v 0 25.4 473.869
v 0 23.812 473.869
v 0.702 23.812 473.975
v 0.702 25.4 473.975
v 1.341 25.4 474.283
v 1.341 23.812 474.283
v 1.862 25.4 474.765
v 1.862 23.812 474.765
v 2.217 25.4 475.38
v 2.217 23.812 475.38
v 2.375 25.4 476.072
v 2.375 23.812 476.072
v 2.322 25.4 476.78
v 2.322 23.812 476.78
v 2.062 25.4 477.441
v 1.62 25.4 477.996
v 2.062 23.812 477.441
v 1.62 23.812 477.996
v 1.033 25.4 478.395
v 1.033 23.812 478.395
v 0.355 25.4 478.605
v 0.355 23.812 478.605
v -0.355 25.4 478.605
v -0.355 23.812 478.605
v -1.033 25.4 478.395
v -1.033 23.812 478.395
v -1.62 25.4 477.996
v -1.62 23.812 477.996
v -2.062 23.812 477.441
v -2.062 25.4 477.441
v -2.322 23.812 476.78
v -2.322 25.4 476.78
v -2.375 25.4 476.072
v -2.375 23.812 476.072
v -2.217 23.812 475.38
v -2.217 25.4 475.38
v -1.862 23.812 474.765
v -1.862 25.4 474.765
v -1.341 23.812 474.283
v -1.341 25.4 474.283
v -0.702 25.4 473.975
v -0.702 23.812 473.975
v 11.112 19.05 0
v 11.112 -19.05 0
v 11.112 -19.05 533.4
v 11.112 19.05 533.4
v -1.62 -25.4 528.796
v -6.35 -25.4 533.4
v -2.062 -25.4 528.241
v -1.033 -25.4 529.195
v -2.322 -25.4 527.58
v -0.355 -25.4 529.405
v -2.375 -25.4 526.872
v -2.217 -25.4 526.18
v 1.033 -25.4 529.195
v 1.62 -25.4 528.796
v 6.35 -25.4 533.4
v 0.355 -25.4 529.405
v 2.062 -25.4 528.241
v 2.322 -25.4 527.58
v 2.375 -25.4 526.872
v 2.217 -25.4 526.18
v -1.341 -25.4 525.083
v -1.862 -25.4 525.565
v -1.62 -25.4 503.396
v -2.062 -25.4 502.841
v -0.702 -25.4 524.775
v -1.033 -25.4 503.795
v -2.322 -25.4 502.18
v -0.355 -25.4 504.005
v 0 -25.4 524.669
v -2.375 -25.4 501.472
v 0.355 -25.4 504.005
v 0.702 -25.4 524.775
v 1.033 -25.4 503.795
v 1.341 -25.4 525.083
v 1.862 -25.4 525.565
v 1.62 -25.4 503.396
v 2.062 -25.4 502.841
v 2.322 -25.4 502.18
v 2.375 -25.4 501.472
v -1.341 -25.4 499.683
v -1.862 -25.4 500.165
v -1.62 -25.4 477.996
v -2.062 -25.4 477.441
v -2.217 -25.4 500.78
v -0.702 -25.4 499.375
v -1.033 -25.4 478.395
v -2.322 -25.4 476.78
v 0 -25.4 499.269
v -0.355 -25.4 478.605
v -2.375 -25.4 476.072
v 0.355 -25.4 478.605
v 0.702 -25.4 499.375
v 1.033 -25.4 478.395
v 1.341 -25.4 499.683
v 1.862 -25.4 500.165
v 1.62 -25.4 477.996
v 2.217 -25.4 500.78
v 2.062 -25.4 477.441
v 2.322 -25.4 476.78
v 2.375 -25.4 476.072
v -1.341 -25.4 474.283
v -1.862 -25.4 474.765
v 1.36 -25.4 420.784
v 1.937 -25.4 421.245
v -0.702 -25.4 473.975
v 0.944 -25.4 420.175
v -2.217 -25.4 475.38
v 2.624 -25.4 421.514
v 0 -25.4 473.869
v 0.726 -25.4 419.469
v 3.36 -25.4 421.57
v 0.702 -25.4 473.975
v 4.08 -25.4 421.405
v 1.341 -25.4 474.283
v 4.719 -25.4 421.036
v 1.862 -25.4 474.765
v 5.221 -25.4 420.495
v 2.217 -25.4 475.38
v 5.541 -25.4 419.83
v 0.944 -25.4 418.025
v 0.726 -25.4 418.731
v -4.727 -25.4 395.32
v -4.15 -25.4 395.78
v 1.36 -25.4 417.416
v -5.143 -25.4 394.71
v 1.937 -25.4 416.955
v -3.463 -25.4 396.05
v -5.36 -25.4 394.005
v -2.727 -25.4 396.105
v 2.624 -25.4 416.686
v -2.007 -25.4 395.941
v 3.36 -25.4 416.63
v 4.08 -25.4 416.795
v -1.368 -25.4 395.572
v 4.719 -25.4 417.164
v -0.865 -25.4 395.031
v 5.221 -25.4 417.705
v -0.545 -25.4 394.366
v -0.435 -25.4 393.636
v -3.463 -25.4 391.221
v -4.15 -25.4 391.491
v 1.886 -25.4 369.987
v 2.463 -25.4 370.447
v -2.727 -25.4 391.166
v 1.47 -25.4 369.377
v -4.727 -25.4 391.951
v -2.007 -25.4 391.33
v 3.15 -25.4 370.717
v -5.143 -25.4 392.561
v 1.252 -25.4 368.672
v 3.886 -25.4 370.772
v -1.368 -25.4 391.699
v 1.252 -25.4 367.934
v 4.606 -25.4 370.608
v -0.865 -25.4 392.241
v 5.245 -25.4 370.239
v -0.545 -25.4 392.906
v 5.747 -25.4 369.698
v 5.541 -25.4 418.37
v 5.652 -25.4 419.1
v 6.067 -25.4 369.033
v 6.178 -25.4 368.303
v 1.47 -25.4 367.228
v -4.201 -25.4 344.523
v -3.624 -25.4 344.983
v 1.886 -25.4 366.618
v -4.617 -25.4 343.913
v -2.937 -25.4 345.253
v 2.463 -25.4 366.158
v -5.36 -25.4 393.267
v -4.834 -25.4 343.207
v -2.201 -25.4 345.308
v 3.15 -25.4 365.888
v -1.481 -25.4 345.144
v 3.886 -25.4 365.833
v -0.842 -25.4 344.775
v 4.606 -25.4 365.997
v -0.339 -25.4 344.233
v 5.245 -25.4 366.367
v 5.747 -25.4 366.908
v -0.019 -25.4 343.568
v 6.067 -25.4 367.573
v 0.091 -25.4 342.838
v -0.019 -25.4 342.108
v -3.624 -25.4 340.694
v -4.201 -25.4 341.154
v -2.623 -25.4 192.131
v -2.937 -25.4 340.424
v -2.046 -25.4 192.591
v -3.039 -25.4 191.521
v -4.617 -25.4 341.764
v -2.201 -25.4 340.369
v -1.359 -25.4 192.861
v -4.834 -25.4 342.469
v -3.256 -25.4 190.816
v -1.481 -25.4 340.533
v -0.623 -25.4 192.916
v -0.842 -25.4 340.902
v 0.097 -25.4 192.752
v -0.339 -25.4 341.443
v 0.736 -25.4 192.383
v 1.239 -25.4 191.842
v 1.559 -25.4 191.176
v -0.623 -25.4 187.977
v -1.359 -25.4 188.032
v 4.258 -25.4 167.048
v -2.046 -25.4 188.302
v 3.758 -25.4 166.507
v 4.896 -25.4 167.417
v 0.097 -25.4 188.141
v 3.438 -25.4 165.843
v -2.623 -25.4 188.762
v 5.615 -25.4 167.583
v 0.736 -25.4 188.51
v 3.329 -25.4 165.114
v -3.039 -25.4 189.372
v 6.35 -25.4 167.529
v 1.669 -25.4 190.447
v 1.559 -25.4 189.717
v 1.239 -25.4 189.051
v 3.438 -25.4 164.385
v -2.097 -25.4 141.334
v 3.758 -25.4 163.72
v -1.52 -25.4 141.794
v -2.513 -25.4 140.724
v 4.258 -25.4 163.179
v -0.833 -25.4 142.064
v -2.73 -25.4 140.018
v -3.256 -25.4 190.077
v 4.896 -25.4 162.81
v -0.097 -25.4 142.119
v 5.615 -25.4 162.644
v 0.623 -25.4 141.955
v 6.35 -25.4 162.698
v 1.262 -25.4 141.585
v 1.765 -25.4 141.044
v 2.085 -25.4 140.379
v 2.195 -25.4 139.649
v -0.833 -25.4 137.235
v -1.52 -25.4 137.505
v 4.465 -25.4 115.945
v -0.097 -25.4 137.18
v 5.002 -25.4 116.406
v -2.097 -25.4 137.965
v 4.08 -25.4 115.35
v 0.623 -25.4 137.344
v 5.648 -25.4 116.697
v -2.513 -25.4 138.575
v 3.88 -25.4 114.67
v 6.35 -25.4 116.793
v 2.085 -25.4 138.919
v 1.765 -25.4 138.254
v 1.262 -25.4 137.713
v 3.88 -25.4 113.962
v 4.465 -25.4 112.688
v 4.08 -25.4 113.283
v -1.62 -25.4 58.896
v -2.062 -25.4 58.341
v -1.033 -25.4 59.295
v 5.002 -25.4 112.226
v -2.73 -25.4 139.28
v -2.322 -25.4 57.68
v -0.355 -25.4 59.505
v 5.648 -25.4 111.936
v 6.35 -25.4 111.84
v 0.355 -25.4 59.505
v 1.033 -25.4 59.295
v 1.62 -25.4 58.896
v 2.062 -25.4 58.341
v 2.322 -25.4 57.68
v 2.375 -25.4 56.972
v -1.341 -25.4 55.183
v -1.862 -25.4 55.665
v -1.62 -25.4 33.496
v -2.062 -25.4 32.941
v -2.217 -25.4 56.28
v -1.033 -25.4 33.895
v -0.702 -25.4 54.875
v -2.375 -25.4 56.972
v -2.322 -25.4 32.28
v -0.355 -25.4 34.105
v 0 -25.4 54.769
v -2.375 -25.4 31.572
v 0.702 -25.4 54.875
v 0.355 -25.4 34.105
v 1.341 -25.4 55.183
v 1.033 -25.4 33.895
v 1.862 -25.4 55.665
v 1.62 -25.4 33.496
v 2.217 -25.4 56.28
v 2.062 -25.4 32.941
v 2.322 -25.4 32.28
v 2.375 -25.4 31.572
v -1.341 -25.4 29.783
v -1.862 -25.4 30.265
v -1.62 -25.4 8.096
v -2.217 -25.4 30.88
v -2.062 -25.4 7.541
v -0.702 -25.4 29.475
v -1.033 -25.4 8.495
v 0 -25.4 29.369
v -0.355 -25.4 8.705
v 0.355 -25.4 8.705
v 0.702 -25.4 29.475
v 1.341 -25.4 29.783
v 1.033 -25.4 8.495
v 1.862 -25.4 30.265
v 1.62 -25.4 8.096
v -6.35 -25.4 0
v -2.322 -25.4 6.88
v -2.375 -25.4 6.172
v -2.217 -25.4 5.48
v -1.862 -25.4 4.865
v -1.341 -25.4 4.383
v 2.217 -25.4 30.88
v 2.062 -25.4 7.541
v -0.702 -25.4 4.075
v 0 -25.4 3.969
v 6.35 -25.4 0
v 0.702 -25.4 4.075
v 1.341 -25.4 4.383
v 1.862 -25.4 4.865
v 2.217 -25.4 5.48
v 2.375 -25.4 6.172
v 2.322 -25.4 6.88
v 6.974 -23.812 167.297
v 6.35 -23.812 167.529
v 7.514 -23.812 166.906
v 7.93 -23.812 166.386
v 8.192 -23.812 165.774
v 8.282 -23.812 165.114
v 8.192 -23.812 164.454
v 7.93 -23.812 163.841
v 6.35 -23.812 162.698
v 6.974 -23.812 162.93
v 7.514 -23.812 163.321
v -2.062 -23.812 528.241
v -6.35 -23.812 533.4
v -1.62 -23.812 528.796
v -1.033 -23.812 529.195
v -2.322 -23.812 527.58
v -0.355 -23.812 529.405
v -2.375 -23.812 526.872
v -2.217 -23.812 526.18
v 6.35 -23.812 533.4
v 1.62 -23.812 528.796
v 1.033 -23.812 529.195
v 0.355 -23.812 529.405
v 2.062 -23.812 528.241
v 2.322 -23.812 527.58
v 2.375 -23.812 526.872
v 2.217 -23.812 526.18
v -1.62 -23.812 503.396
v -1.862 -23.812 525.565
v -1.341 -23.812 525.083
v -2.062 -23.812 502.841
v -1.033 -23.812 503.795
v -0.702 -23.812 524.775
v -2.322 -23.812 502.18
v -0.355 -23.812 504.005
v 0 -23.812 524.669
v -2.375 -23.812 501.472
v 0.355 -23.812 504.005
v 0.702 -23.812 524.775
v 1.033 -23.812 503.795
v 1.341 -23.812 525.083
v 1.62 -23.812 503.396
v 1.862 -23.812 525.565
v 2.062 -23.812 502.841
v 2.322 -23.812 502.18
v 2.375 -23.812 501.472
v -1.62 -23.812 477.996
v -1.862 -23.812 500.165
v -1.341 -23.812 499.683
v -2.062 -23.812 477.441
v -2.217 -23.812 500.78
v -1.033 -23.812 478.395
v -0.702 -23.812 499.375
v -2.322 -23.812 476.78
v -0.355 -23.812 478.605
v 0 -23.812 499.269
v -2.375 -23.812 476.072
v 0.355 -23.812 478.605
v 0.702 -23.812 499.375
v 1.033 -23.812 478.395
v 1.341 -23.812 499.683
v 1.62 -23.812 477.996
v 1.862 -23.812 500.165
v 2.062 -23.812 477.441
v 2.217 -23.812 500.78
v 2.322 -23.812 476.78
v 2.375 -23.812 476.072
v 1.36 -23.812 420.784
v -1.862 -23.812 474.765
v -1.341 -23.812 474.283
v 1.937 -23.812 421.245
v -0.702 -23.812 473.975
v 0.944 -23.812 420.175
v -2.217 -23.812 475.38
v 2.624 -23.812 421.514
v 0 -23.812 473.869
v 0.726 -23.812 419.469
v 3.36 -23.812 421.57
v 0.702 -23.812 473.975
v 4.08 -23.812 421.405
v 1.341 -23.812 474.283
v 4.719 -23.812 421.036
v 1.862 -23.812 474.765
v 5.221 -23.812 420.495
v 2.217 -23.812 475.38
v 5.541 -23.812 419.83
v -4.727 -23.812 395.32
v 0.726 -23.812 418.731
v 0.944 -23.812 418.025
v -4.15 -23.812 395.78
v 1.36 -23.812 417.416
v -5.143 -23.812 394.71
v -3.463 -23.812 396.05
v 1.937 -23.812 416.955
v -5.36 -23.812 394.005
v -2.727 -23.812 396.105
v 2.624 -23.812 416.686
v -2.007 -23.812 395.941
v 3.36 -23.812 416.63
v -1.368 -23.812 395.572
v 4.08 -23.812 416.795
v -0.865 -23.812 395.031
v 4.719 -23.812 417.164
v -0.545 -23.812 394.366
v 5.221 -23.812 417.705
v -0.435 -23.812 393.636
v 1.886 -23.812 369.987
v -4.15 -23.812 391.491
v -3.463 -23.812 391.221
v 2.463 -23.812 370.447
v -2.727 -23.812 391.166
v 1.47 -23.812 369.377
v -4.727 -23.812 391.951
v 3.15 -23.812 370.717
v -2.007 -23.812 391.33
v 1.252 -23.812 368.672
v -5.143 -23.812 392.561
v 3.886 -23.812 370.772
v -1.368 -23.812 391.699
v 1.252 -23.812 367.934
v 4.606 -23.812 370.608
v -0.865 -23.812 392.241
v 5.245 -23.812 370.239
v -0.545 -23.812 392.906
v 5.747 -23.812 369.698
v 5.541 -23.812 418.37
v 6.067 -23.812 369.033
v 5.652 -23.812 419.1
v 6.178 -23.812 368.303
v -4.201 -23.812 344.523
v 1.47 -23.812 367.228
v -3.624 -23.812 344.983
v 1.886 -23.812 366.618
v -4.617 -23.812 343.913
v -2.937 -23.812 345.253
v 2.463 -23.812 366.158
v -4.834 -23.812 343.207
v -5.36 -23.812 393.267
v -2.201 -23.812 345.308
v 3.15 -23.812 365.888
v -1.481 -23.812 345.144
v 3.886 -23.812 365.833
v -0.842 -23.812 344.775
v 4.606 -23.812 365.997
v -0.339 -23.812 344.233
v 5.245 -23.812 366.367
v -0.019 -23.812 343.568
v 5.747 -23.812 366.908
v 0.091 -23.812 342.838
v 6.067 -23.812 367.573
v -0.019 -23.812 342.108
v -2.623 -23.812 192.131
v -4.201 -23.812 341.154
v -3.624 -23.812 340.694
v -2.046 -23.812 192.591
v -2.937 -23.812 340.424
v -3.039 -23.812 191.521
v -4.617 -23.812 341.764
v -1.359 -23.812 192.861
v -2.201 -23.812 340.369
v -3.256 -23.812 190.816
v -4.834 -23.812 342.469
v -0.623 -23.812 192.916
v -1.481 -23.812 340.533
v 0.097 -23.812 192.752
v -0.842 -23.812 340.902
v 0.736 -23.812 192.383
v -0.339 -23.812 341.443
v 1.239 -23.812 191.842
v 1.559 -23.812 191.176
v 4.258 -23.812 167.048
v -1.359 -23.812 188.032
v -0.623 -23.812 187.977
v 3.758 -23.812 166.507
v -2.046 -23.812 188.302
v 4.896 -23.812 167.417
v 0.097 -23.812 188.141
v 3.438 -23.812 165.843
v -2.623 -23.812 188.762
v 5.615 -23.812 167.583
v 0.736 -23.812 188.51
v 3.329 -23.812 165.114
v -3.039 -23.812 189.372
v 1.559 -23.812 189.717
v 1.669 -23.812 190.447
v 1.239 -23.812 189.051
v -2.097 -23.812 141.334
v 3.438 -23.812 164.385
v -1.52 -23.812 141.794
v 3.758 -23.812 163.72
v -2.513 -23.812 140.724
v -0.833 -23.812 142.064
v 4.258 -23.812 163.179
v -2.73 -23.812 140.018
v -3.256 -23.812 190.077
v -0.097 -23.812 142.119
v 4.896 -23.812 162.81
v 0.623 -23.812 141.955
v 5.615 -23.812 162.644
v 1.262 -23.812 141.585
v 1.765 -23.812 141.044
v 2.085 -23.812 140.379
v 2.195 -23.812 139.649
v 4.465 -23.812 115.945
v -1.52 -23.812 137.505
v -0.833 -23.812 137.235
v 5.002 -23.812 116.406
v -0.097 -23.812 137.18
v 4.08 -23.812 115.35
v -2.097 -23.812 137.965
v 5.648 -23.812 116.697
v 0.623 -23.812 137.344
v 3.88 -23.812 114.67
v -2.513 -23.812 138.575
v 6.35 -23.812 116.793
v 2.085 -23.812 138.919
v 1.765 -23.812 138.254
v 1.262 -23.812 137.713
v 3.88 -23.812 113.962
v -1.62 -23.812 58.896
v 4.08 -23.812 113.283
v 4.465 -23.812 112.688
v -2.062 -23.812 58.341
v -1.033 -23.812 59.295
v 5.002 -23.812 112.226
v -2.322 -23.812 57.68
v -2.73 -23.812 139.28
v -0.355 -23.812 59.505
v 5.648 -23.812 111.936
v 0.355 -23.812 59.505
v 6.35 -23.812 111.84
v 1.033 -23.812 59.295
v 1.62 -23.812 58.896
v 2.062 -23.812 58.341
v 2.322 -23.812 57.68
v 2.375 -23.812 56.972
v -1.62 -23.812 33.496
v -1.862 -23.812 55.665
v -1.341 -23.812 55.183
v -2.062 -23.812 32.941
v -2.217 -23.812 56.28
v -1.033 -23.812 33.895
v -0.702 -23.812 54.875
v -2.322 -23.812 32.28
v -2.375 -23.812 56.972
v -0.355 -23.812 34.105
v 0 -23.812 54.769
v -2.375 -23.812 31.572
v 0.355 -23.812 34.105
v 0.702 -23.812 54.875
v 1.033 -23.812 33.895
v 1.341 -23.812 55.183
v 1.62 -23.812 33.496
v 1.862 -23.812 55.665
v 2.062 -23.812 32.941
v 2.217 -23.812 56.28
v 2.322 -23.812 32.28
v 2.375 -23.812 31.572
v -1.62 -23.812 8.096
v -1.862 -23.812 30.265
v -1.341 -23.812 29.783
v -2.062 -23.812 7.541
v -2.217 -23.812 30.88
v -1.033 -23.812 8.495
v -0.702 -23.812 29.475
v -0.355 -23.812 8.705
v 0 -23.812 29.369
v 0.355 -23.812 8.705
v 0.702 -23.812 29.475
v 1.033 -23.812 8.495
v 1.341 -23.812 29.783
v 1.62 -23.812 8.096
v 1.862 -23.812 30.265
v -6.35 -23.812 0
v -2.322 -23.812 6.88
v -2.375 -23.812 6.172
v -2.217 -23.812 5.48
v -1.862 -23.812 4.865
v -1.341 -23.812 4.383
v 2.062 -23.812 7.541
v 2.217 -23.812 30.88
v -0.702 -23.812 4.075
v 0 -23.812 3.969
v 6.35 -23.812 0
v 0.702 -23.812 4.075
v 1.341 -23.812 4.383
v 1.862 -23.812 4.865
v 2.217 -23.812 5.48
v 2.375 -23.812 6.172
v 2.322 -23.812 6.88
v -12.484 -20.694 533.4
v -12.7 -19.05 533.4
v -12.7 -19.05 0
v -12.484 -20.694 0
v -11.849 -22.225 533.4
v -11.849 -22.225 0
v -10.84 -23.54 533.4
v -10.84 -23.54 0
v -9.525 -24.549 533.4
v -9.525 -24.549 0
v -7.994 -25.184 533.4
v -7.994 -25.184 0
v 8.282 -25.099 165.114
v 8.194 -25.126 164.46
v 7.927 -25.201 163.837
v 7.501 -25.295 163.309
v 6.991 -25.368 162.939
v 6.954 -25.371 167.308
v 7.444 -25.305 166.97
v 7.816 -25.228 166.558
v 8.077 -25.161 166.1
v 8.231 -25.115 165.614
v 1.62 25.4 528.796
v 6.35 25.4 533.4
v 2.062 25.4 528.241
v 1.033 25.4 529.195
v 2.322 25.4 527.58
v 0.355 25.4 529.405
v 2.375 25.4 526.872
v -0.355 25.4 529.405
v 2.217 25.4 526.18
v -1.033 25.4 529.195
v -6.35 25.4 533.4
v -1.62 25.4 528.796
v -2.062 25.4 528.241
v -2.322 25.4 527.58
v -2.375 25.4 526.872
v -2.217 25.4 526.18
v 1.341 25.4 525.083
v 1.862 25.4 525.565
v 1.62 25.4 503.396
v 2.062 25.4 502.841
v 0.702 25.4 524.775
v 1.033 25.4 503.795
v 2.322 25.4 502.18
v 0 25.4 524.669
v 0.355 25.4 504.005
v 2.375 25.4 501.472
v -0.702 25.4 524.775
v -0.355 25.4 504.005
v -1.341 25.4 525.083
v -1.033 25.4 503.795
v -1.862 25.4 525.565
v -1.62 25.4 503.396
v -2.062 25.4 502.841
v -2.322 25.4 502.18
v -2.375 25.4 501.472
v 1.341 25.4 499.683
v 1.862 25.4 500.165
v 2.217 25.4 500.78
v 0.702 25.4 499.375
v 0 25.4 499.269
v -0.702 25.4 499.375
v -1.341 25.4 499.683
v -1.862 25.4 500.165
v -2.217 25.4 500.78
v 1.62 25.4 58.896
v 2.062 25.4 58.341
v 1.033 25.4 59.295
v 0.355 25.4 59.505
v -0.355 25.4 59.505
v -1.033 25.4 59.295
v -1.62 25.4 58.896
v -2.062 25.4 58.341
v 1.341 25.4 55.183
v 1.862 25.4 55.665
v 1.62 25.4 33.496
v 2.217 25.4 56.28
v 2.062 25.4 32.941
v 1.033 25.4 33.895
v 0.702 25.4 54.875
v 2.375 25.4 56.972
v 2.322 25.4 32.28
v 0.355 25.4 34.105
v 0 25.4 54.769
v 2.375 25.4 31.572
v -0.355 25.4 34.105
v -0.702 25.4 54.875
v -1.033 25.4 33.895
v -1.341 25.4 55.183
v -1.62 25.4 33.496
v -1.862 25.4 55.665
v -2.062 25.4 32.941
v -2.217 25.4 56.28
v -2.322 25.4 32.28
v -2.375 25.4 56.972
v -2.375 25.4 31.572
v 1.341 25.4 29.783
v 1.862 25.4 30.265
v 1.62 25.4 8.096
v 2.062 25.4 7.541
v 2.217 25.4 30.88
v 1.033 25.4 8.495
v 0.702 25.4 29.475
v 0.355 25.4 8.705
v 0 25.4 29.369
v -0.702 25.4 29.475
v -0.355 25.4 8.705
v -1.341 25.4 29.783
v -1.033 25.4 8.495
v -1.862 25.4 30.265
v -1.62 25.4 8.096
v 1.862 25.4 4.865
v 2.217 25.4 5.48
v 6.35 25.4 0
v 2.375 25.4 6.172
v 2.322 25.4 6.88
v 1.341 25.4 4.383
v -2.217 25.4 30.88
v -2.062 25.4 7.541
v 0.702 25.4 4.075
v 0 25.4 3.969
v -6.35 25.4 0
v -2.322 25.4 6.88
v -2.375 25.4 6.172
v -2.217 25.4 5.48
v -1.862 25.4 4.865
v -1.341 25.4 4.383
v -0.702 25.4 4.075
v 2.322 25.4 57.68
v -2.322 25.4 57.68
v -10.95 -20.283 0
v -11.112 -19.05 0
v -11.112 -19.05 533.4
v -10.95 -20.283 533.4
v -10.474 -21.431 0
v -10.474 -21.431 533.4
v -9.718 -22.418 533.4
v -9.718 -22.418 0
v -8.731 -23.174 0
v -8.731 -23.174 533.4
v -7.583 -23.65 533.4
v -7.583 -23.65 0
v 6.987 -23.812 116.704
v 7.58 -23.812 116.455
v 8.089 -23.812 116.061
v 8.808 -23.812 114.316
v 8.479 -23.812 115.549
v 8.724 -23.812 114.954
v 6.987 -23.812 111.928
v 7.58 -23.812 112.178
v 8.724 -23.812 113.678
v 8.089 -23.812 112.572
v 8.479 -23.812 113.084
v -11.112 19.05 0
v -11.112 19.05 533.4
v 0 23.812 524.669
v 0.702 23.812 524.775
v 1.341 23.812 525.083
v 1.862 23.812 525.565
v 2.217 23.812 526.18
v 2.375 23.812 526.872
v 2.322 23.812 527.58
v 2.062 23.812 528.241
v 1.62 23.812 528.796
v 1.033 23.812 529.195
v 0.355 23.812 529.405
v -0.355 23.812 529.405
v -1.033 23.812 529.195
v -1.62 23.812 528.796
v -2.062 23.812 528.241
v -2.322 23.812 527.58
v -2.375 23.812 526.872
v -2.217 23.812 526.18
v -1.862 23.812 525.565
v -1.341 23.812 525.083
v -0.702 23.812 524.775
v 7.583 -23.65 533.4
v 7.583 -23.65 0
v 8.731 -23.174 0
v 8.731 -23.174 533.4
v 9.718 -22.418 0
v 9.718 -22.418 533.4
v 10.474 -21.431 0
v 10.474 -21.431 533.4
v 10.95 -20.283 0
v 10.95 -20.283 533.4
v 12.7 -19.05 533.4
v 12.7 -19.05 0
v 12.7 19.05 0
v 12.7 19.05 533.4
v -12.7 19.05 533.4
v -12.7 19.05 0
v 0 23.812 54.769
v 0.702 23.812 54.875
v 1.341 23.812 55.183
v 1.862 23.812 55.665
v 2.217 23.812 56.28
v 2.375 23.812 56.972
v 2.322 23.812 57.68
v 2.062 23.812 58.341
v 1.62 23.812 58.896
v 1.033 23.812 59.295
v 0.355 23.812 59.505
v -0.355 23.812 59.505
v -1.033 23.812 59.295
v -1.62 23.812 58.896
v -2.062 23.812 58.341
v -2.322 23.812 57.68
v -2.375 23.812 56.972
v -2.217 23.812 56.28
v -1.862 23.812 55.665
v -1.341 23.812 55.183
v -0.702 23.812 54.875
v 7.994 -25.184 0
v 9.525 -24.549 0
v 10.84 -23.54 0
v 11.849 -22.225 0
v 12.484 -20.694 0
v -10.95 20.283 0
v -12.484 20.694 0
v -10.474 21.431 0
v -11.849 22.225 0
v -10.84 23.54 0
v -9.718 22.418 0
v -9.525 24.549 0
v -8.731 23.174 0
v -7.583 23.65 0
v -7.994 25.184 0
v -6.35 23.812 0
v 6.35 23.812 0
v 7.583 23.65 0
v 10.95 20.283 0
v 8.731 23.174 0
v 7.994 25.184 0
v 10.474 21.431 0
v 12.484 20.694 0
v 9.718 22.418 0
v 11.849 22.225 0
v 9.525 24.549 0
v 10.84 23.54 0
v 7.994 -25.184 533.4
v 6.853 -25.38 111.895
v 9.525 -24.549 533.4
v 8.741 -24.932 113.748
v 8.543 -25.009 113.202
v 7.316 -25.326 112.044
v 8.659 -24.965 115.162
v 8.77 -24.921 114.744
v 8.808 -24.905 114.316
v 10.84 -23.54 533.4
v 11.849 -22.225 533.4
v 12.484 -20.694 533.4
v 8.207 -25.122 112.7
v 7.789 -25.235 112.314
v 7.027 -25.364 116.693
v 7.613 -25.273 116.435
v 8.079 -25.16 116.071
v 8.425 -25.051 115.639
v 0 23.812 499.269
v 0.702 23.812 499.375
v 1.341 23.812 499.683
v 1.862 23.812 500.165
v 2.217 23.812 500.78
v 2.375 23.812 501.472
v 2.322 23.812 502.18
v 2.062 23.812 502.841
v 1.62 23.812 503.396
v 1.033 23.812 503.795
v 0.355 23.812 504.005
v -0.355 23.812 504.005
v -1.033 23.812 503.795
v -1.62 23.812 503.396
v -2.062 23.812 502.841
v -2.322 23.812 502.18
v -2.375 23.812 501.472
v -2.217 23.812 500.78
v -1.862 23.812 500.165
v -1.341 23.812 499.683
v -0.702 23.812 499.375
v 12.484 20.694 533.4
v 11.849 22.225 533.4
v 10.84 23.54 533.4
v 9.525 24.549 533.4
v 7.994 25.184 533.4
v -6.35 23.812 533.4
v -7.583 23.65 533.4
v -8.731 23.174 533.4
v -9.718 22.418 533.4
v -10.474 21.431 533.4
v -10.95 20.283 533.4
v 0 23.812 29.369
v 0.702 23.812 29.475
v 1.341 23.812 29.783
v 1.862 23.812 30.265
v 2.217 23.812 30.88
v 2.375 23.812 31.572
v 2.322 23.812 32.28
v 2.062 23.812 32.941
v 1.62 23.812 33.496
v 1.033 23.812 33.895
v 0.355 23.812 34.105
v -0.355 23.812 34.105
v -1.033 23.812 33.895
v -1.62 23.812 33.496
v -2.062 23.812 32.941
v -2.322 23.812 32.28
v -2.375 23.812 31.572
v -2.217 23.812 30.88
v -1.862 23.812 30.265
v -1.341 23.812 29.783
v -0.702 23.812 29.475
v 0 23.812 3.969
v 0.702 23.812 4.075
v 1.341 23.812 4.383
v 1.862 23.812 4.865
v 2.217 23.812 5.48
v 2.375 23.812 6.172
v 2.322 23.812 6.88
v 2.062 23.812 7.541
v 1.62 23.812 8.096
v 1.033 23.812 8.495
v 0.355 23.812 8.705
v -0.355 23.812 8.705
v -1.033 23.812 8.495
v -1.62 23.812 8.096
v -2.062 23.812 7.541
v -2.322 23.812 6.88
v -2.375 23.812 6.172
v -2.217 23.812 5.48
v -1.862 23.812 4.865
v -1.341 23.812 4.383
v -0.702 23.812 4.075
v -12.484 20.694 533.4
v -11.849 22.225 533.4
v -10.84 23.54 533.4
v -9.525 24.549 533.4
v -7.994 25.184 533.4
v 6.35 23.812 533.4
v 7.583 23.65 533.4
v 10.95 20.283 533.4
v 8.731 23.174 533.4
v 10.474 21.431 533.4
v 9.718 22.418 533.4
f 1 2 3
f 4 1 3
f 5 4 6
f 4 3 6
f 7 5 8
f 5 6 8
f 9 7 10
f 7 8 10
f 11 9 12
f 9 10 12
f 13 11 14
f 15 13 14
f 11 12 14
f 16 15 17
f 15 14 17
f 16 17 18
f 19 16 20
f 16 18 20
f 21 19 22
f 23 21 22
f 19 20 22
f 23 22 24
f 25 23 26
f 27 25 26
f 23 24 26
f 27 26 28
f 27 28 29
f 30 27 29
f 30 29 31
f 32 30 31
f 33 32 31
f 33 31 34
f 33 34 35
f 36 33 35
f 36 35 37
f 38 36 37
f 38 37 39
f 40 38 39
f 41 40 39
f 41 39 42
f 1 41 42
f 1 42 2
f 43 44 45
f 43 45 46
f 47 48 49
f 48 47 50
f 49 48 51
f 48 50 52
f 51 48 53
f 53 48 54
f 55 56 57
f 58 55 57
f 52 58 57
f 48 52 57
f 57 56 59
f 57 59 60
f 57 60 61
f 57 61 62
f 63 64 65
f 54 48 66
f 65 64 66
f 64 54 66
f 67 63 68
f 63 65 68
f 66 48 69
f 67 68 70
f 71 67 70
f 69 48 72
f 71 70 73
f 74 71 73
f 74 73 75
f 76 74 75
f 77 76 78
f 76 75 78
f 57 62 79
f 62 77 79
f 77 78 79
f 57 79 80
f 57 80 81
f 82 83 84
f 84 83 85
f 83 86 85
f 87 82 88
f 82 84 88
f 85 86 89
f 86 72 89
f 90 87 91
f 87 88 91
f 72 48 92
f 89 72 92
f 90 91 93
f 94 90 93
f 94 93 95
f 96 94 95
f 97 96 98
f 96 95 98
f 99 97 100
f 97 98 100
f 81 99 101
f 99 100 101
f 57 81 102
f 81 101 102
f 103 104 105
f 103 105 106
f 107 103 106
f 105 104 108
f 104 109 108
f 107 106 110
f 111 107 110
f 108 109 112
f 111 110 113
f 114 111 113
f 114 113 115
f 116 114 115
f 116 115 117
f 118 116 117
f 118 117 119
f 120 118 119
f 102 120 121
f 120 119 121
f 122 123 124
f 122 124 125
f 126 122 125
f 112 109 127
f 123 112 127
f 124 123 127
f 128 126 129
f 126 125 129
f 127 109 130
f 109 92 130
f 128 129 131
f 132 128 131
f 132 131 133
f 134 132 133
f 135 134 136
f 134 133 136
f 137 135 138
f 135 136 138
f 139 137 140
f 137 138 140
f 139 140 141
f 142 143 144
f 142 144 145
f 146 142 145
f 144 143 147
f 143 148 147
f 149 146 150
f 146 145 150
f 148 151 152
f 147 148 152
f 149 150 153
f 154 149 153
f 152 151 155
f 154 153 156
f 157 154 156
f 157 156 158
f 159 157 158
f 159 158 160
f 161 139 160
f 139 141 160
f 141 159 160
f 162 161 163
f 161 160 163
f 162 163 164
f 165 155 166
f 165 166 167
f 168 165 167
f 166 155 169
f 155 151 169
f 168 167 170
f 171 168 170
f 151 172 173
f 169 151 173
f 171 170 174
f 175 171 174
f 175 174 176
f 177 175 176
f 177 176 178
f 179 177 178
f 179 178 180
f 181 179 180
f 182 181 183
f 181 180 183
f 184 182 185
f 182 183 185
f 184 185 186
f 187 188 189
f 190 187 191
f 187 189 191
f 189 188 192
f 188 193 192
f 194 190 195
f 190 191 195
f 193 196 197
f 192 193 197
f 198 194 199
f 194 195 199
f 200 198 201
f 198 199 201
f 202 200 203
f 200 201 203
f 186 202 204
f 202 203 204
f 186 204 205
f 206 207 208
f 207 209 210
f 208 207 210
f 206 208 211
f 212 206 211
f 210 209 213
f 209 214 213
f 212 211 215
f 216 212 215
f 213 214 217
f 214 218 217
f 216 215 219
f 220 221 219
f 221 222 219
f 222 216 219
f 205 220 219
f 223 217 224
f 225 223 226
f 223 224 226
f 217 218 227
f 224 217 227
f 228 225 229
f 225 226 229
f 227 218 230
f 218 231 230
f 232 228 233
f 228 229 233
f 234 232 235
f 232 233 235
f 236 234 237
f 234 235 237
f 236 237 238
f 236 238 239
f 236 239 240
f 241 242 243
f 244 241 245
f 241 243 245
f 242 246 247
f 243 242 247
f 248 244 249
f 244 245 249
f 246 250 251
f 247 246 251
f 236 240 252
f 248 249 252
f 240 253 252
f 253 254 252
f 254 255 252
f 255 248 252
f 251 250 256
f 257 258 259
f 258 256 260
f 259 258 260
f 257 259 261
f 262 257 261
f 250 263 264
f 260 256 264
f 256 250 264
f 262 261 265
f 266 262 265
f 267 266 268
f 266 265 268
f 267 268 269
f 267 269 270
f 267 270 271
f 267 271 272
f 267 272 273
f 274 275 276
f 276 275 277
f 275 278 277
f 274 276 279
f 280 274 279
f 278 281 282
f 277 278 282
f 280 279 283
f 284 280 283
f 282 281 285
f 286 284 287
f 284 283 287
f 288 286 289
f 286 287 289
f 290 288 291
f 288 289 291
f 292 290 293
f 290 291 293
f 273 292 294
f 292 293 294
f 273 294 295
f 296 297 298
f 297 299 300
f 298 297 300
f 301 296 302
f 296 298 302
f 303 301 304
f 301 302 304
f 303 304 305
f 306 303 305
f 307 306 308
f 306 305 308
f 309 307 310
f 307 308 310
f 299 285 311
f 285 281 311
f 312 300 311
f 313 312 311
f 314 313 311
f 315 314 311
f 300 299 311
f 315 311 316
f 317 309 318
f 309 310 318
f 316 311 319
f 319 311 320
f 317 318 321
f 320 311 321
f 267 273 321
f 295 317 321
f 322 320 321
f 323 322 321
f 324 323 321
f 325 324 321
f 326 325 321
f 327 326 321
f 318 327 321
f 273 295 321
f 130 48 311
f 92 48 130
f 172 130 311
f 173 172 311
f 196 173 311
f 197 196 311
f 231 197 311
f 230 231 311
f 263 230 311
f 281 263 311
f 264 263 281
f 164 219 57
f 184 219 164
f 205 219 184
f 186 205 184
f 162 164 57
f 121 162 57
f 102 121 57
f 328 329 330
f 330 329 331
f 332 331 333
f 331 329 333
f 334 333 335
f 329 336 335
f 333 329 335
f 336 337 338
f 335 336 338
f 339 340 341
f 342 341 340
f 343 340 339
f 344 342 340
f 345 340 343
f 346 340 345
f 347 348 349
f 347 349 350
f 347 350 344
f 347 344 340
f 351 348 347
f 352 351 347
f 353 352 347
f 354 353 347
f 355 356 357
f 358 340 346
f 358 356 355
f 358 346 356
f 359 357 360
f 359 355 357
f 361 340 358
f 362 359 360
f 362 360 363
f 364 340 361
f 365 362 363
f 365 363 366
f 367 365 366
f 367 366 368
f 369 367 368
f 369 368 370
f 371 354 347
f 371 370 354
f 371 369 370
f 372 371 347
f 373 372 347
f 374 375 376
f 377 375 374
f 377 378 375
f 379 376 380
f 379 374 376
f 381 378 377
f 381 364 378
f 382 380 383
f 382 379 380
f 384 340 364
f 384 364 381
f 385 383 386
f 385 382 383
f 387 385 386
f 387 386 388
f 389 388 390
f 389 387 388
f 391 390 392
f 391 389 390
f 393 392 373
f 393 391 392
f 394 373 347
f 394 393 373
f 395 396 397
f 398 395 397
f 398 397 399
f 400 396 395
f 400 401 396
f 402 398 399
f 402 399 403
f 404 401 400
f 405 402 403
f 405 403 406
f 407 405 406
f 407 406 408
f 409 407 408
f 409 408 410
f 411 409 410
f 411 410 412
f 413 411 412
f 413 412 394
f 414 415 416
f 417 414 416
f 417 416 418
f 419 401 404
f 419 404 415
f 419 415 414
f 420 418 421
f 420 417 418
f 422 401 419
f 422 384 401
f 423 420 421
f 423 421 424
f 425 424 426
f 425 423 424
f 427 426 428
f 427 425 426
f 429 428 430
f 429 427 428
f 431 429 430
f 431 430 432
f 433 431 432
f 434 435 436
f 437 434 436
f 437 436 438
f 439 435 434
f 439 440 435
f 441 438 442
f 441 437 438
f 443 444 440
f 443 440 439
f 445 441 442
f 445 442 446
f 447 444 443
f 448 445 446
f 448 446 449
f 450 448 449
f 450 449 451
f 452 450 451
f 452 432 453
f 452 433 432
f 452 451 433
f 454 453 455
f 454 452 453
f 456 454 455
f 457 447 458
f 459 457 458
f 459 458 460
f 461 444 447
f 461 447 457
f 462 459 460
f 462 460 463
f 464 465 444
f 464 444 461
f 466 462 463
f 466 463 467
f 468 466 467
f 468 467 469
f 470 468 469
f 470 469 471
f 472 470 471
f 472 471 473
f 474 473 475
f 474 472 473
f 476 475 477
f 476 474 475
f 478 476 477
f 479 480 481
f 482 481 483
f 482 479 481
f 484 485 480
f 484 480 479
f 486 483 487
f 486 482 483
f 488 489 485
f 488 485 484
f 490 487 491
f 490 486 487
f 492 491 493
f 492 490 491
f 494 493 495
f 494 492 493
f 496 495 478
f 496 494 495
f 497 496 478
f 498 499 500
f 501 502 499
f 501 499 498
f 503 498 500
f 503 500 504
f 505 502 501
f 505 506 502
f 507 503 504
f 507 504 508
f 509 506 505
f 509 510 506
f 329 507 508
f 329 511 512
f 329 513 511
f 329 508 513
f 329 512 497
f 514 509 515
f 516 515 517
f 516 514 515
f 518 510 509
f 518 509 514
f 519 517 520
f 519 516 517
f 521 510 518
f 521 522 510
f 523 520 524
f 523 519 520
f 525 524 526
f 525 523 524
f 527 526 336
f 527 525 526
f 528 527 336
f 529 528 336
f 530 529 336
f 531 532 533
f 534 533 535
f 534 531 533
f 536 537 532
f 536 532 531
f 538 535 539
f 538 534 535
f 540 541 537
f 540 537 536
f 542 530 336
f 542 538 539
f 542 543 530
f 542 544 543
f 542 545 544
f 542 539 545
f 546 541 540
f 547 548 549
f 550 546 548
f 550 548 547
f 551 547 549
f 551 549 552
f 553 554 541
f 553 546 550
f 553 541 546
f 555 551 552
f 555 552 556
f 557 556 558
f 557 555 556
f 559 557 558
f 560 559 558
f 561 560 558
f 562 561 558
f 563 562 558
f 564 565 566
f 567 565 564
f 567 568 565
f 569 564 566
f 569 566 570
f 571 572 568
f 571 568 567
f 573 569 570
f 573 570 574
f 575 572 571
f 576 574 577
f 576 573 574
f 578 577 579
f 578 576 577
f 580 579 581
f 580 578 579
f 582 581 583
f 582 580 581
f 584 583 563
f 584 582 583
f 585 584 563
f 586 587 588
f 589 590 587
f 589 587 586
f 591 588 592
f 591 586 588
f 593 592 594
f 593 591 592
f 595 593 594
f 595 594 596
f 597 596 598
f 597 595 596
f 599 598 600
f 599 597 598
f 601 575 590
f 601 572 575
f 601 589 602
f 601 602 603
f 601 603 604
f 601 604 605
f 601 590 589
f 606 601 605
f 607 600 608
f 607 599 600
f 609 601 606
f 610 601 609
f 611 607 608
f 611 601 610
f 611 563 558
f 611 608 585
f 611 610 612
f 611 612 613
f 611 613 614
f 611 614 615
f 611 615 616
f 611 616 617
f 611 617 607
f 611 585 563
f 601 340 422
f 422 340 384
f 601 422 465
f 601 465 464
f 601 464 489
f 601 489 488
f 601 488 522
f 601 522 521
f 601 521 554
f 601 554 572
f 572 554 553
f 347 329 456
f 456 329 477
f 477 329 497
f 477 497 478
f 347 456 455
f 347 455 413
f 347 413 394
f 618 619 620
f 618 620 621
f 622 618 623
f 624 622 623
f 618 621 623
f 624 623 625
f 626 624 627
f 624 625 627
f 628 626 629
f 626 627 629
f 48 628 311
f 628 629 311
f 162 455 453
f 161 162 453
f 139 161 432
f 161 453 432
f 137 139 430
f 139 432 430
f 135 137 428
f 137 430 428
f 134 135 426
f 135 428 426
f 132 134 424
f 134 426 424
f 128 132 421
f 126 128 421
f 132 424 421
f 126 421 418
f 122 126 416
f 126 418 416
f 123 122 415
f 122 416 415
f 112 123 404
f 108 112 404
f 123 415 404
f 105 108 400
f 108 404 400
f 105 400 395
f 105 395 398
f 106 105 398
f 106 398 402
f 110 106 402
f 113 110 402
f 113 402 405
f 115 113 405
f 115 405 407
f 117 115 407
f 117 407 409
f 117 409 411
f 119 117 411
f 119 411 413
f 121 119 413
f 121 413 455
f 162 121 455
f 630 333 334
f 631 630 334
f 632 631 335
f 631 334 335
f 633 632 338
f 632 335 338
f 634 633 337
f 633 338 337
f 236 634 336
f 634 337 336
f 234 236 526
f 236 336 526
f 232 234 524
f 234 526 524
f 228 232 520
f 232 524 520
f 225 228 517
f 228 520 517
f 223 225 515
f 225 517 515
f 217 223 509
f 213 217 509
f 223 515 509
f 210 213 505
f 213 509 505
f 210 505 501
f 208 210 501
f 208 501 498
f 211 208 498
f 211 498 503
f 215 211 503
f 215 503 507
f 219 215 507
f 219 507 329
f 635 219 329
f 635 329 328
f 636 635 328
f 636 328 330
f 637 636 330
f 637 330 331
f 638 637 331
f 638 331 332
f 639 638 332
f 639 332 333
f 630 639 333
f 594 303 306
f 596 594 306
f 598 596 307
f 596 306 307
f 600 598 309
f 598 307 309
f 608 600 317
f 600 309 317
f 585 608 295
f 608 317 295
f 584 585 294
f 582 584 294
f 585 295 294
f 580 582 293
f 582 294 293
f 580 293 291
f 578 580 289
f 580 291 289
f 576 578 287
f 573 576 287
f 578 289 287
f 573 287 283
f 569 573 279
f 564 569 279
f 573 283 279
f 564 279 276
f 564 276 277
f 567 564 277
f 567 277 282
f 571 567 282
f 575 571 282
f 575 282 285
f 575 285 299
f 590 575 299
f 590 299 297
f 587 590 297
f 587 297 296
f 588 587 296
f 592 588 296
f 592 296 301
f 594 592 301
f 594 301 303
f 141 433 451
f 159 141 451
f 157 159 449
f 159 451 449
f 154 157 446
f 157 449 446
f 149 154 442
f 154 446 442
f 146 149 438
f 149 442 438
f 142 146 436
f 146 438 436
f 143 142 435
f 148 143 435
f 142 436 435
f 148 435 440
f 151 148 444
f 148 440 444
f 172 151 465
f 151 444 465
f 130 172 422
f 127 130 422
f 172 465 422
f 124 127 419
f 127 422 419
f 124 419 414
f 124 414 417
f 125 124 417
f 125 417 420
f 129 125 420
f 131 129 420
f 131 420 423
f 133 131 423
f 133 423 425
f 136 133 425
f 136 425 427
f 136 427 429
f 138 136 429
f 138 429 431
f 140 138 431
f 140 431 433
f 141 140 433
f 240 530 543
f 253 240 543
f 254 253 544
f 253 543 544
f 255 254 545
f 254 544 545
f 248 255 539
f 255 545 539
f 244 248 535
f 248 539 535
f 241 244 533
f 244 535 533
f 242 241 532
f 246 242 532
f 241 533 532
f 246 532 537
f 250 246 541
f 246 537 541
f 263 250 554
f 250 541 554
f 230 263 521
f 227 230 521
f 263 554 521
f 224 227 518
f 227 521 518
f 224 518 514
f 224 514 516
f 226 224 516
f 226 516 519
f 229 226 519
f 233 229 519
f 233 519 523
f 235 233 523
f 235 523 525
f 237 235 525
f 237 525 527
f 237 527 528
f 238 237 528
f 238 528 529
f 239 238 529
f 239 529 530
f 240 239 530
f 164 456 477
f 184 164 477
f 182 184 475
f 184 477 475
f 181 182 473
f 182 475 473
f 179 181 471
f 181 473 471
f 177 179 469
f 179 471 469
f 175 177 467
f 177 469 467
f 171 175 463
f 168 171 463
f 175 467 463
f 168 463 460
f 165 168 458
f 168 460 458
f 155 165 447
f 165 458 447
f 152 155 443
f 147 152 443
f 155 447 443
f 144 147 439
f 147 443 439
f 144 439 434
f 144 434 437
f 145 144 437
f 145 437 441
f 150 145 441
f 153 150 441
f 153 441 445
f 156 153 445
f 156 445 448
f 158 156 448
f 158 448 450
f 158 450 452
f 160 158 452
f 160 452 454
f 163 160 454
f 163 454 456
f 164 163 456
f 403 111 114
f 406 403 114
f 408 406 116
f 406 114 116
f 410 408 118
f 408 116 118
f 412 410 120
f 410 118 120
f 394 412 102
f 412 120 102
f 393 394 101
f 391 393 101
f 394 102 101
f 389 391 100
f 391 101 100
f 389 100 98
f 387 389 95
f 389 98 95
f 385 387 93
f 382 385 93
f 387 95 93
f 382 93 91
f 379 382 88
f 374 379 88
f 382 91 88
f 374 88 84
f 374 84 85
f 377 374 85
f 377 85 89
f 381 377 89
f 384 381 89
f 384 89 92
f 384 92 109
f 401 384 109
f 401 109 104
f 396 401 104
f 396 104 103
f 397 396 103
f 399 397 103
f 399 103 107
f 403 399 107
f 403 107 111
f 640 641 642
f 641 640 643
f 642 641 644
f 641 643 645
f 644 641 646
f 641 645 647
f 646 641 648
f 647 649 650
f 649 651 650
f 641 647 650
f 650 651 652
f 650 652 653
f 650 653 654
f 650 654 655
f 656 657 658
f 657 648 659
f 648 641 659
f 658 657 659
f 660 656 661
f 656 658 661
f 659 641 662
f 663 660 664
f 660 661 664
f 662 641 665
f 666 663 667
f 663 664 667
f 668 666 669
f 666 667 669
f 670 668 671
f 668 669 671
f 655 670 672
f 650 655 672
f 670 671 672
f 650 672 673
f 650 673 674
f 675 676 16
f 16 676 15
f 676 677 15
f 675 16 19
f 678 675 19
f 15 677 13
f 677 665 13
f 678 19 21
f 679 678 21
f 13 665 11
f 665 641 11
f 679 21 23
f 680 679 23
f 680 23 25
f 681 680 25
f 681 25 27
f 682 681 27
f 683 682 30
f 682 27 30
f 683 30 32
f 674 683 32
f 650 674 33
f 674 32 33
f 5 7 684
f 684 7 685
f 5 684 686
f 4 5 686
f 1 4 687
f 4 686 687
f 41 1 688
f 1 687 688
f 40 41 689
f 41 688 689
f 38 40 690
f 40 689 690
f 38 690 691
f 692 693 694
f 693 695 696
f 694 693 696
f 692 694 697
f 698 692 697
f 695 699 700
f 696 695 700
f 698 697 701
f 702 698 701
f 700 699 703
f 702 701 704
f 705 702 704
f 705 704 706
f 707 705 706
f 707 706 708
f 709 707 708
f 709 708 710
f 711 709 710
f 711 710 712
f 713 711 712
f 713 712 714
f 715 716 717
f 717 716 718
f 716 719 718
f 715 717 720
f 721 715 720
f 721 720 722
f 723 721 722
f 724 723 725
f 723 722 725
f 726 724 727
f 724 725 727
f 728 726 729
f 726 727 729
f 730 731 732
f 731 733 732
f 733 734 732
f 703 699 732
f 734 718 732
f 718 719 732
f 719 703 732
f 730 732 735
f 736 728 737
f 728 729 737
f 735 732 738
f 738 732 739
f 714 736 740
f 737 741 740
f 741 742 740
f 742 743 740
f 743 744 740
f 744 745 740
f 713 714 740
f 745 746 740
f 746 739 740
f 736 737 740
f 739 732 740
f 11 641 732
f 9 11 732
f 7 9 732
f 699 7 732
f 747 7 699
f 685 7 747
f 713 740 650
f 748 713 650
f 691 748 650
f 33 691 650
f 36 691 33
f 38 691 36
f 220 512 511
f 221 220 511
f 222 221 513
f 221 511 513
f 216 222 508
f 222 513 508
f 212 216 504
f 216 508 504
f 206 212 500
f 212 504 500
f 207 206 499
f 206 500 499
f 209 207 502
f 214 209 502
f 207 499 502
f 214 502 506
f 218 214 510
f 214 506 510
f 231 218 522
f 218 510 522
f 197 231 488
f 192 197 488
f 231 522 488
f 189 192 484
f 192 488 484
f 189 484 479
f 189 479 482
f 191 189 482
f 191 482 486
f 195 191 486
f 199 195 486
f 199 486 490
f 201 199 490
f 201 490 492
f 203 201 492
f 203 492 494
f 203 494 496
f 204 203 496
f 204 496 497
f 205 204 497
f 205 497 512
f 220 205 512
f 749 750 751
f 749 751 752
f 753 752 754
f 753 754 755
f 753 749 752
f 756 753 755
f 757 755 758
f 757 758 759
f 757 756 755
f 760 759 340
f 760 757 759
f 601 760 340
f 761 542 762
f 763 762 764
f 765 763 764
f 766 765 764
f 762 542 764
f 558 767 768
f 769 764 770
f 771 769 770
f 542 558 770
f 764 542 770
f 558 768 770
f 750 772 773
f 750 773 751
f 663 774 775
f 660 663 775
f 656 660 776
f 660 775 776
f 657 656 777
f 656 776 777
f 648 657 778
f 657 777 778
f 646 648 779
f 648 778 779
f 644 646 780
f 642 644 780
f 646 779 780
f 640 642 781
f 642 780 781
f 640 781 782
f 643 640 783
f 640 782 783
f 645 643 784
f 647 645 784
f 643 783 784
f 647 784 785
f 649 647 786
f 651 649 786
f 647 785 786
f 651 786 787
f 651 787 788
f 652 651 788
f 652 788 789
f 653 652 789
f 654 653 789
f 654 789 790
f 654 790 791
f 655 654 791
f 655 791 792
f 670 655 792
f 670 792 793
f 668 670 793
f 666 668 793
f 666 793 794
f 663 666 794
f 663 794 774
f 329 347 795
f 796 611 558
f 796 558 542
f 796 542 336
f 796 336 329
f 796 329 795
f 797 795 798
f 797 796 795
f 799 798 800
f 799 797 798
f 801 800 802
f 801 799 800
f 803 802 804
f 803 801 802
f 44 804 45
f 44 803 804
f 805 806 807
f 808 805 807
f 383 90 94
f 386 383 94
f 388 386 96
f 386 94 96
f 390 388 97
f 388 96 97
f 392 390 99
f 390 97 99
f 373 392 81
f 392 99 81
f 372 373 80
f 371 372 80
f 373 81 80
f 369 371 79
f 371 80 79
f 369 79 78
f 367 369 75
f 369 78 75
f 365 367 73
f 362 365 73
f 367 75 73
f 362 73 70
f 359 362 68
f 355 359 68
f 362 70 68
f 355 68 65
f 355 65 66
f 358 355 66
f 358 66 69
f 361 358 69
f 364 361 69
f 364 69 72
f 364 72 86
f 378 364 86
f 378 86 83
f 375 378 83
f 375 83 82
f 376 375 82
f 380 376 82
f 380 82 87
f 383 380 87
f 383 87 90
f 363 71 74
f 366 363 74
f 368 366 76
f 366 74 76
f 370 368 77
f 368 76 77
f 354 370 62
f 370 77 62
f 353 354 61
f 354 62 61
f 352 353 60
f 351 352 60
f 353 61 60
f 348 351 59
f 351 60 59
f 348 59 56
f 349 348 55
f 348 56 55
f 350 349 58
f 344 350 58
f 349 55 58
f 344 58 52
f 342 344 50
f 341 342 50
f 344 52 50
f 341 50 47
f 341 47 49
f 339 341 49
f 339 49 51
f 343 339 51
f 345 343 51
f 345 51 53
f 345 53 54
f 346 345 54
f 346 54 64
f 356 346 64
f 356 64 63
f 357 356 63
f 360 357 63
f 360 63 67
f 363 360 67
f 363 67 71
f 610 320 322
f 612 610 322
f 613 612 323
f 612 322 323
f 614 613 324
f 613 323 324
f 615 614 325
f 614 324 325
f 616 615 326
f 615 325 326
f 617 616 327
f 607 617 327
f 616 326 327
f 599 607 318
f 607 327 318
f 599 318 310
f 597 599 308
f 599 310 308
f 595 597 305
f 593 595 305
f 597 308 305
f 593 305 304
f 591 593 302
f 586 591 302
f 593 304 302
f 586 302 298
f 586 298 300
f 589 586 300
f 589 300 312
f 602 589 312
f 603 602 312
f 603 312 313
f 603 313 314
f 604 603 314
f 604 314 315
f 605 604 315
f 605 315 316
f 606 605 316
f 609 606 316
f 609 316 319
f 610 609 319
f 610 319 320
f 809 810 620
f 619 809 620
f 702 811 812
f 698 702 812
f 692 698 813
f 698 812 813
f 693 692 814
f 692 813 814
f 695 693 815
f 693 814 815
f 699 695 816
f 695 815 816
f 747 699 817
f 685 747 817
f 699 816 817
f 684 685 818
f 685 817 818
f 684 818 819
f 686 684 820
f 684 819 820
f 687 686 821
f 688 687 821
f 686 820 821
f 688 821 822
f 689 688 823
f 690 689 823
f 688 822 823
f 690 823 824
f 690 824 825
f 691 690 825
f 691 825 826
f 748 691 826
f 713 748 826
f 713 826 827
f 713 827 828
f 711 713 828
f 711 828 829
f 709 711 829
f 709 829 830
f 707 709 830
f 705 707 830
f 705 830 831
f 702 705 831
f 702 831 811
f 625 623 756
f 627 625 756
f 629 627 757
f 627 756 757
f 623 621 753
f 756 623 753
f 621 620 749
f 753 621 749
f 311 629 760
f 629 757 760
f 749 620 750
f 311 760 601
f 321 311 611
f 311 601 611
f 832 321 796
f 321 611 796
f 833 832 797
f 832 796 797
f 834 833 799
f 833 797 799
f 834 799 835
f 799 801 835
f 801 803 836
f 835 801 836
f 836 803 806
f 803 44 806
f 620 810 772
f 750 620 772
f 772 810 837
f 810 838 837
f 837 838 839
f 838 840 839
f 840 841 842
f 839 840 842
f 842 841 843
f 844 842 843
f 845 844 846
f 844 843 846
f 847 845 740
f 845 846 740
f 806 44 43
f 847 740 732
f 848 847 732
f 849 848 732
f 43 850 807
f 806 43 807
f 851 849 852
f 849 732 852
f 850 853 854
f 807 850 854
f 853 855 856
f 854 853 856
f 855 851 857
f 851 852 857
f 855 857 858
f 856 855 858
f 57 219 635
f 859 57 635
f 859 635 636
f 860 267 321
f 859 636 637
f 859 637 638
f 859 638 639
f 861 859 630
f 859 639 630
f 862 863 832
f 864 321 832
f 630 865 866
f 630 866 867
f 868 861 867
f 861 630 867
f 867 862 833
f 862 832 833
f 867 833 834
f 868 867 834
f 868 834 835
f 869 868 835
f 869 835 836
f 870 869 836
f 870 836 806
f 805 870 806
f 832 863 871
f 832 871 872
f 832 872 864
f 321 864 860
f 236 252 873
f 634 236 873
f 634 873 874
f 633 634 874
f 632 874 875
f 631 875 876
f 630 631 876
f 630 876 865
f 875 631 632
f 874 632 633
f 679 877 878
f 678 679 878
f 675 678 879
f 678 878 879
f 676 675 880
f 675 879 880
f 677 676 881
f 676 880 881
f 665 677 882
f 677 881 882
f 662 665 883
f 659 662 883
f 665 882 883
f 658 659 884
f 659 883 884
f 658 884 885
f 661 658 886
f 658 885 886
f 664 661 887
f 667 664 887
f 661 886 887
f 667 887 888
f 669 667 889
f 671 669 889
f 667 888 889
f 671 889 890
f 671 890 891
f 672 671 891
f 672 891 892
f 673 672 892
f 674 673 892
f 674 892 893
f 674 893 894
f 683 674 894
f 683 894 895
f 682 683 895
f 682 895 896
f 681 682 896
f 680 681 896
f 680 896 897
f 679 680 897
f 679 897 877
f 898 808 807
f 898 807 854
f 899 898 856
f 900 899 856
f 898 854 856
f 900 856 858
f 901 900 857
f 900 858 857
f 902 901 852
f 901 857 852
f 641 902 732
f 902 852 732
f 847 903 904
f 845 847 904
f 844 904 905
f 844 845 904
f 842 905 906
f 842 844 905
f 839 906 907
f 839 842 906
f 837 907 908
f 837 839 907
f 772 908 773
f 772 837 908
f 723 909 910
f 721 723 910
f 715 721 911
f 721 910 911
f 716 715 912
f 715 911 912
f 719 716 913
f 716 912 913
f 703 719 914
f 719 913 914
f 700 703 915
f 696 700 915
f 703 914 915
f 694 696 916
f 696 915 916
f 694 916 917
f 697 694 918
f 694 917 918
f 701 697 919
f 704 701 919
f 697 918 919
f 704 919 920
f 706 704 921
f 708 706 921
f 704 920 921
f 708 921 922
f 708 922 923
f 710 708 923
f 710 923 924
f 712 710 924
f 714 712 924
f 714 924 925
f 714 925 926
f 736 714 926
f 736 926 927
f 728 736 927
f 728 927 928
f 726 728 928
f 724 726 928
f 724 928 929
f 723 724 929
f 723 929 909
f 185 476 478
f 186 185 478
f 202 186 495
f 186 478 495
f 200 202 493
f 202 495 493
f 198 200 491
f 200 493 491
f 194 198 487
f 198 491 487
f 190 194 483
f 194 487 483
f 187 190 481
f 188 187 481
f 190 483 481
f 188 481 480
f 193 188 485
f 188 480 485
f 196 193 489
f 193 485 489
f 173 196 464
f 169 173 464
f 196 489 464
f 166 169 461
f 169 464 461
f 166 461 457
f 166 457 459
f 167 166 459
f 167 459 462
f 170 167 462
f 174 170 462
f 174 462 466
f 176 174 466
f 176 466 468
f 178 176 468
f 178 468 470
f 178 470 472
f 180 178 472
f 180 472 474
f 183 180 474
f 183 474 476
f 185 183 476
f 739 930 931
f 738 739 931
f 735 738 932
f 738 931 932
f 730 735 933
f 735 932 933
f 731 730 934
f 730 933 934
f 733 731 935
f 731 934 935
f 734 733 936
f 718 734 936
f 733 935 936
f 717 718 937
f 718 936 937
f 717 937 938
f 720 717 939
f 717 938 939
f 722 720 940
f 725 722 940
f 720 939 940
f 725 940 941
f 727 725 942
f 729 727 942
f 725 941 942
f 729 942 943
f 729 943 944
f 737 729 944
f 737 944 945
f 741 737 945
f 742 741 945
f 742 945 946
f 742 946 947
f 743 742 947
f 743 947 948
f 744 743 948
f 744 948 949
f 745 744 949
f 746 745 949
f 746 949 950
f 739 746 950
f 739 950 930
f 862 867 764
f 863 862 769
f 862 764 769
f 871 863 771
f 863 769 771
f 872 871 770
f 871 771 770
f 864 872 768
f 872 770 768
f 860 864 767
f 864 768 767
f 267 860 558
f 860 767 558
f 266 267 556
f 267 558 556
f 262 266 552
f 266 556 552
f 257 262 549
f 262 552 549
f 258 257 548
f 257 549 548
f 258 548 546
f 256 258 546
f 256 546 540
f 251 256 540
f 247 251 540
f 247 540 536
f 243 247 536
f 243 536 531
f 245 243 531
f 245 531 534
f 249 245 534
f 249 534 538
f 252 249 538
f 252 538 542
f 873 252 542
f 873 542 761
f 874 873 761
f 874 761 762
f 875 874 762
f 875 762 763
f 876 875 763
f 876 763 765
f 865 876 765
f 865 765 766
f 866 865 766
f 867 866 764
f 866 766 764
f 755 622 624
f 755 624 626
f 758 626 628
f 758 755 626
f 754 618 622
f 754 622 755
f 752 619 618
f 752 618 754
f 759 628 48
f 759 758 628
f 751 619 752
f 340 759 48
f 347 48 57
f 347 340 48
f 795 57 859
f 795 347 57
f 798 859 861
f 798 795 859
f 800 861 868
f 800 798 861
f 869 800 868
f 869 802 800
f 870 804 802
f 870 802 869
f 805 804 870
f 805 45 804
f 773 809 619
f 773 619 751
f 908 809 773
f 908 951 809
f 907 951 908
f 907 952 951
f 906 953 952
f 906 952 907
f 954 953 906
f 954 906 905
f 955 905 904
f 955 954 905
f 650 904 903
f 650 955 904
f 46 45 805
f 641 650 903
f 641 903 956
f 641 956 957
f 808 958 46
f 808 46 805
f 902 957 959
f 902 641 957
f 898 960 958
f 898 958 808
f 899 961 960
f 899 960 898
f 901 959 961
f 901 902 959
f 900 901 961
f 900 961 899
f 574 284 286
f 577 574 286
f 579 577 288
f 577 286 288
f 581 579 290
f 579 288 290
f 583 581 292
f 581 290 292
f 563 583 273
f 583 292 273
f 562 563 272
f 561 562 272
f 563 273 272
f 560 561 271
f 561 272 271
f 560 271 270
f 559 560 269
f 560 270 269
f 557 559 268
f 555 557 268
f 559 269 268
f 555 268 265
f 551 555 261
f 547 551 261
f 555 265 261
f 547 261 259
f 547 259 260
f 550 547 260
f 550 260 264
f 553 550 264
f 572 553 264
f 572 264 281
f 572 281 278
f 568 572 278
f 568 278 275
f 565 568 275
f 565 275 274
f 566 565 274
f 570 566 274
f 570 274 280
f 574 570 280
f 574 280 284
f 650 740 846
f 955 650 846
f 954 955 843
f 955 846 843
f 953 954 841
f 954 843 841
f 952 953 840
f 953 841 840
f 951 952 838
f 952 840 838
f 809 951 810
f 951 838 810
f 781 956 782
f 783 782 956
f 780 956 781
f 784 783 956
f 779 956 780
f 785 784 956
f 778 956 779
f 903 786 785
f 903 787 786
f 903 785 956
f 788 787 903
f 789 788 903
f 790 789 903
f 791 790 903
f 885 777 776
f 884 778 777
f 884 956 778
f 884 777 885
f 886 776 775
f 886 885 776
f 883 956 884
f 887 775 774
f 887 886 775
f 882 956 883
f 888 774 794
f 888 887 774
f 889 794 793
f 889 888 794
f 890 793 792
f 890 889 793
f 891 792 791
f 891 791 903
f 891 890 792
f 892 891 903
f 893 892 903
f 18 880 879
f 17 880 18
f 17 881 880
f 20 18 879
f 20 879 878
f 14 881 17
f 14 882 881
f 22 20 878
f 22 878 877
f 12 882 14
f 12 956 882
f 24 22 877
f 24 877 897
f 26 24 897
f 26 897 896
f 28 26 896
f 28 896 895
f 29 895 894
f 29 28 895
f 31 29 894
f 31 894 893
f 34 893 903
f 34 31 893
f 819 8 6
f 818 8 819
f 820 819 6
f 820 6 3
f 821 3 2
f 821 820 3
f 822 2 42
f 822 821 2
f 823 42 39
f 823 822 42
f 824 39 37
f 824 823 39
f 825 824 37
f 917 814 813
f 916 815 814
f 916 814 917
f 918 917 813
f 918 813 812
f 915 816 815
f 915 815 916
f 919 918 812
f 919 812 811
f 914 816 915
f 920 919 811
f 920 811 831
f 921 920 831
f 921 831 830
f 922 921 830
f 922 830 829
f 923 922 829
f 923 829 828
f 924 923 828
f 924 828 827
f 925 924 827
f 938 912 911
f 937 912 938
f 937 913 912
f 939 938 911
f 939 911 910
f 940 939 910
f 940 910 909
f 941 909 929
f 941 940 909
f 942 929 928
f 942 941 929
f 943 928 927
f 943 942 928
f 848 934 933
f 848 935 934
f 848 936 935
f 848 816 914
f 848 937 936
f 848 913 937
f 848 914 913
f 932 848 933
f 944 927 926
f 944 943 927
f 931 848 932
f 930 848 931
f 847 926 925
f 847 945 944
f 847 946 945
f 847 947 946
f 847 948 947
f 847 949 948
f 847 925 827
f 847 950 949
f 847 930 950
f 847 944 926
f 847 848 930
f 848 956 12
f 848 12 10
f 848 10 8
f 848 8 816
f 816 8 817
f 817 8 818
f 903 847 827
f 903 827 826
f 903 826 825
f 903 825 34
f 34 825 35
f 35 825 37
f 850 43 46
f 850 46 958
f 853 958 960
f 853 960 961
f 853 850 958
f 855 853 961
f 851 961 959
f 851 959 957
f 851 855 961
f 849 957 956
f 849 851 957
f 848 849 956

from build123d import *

# Parameters (mm, degrees)
EXTRUDE_THIN1_DEPTH               = 533.4
F_3_16_0_1875_DIAMETER_HOLE1_D    = 4.7625
F_3_16_0_195_DIAMETER_HOLE1_D     = 4.953
F_3_16_0_195_DIAMETER_HOLE1_DEPTH = 1.5875


with BuildPart() as part:
    # Sketch1 → Extrude-Thin1 (new body)
    with BuildSketch(Plane.XY):
        with BuildLine():
            Line((-12.7, 19.05), (-12.7, -19.05))
            ThreePointArc((-12.7, -19.05), (-10.840128061, -23.540128061), (-6.35, -25.4))
            Line((-6.35, -25.4), (6.35, -25.4))
            ThreePointArc((6.35, -25.4), (10.840128061, -23.540128061), (12.7, -19.05))
            Line((12.7, -19.05), (12.7, 19.05))
            ThreePointArc((12.7, 19.05), (10.840128061, 23.540128061), (6.35, 25.4))
            Line((6.35, 25.4), (-6.35, 25.4))
            ThreePointArc((-6.35, 25.4), (-10.840128061, 23.540128061), (-12.7, 19.05))
        make_face()
        with BuildLine():
            Line((-11.1125, 19.05), (-11.1125, -19.05))
            ThreePointArc((-11.1125, -19.05), (-9.717596045, -22.417596045), (-6.35, -23.8125))
            Line((-6.35, -23.8125), (6.35, -23.8125))
            ThreePointArc((6.35, -23.8125), (9.717596045, -22.417596045), (11.1125, -19.05))
            Line((11.1125, -19.05), (11.1125, 19.05))
            ThreePointArc((11.1125, 19.05), (9.717596045, 22.417596045), (6.35, 23.8125))
            Line((6.35, 23.8125), (-6.35, 23.8125))
            ThreePointArc((-6.35, 23.8125), (-9.717596045, 22.417596045), (-11.1125, 19.05))
        make_face(mode=Mode.SUBTRACT)
    extrude(amount=EXTRUDE_THIN1_DEPTH)

    # 3/16 (0.1875) Diameter Hole1 (through all)
    with Locations(Plane(origin=(0, 25.4, 527.05), x_dir=(0, 0, 1), z_dir=(0, 1, 0))):
        with Locations((0, 0), (-520.7, 0), (-495.3, 0), (-469.9, 0), (-25.4, 0), (-50.8, 0)):
            Hole(F_3_16_0_1875_DIAMETER_HOLE1_D / 2)

    # 3/16 (0.195) Diameter Hole1
    with Locations(Plane(origin=(0, -25.4, 0), x_dir=(-1, 0, 0), z_dir=(0, -1, 0))):
        with Locations((-6.331002809, -114.316339601), (0.281657017, -139.649227909), (-5.805002341, -165.113616334), (0.807657485, -190.446504642), (-3.175, -419.1), (2.911659358, -393.635611575), (-3.701000468, -368.302723267), (2.385658889, -342.838334842)):
            Hole(F_3_16_0_195_DIAMETER_HOLE1_D / 2, depth=F_3_16_0_195_DIAMETER_HOLE1_DEPTH)


solid = part.part
